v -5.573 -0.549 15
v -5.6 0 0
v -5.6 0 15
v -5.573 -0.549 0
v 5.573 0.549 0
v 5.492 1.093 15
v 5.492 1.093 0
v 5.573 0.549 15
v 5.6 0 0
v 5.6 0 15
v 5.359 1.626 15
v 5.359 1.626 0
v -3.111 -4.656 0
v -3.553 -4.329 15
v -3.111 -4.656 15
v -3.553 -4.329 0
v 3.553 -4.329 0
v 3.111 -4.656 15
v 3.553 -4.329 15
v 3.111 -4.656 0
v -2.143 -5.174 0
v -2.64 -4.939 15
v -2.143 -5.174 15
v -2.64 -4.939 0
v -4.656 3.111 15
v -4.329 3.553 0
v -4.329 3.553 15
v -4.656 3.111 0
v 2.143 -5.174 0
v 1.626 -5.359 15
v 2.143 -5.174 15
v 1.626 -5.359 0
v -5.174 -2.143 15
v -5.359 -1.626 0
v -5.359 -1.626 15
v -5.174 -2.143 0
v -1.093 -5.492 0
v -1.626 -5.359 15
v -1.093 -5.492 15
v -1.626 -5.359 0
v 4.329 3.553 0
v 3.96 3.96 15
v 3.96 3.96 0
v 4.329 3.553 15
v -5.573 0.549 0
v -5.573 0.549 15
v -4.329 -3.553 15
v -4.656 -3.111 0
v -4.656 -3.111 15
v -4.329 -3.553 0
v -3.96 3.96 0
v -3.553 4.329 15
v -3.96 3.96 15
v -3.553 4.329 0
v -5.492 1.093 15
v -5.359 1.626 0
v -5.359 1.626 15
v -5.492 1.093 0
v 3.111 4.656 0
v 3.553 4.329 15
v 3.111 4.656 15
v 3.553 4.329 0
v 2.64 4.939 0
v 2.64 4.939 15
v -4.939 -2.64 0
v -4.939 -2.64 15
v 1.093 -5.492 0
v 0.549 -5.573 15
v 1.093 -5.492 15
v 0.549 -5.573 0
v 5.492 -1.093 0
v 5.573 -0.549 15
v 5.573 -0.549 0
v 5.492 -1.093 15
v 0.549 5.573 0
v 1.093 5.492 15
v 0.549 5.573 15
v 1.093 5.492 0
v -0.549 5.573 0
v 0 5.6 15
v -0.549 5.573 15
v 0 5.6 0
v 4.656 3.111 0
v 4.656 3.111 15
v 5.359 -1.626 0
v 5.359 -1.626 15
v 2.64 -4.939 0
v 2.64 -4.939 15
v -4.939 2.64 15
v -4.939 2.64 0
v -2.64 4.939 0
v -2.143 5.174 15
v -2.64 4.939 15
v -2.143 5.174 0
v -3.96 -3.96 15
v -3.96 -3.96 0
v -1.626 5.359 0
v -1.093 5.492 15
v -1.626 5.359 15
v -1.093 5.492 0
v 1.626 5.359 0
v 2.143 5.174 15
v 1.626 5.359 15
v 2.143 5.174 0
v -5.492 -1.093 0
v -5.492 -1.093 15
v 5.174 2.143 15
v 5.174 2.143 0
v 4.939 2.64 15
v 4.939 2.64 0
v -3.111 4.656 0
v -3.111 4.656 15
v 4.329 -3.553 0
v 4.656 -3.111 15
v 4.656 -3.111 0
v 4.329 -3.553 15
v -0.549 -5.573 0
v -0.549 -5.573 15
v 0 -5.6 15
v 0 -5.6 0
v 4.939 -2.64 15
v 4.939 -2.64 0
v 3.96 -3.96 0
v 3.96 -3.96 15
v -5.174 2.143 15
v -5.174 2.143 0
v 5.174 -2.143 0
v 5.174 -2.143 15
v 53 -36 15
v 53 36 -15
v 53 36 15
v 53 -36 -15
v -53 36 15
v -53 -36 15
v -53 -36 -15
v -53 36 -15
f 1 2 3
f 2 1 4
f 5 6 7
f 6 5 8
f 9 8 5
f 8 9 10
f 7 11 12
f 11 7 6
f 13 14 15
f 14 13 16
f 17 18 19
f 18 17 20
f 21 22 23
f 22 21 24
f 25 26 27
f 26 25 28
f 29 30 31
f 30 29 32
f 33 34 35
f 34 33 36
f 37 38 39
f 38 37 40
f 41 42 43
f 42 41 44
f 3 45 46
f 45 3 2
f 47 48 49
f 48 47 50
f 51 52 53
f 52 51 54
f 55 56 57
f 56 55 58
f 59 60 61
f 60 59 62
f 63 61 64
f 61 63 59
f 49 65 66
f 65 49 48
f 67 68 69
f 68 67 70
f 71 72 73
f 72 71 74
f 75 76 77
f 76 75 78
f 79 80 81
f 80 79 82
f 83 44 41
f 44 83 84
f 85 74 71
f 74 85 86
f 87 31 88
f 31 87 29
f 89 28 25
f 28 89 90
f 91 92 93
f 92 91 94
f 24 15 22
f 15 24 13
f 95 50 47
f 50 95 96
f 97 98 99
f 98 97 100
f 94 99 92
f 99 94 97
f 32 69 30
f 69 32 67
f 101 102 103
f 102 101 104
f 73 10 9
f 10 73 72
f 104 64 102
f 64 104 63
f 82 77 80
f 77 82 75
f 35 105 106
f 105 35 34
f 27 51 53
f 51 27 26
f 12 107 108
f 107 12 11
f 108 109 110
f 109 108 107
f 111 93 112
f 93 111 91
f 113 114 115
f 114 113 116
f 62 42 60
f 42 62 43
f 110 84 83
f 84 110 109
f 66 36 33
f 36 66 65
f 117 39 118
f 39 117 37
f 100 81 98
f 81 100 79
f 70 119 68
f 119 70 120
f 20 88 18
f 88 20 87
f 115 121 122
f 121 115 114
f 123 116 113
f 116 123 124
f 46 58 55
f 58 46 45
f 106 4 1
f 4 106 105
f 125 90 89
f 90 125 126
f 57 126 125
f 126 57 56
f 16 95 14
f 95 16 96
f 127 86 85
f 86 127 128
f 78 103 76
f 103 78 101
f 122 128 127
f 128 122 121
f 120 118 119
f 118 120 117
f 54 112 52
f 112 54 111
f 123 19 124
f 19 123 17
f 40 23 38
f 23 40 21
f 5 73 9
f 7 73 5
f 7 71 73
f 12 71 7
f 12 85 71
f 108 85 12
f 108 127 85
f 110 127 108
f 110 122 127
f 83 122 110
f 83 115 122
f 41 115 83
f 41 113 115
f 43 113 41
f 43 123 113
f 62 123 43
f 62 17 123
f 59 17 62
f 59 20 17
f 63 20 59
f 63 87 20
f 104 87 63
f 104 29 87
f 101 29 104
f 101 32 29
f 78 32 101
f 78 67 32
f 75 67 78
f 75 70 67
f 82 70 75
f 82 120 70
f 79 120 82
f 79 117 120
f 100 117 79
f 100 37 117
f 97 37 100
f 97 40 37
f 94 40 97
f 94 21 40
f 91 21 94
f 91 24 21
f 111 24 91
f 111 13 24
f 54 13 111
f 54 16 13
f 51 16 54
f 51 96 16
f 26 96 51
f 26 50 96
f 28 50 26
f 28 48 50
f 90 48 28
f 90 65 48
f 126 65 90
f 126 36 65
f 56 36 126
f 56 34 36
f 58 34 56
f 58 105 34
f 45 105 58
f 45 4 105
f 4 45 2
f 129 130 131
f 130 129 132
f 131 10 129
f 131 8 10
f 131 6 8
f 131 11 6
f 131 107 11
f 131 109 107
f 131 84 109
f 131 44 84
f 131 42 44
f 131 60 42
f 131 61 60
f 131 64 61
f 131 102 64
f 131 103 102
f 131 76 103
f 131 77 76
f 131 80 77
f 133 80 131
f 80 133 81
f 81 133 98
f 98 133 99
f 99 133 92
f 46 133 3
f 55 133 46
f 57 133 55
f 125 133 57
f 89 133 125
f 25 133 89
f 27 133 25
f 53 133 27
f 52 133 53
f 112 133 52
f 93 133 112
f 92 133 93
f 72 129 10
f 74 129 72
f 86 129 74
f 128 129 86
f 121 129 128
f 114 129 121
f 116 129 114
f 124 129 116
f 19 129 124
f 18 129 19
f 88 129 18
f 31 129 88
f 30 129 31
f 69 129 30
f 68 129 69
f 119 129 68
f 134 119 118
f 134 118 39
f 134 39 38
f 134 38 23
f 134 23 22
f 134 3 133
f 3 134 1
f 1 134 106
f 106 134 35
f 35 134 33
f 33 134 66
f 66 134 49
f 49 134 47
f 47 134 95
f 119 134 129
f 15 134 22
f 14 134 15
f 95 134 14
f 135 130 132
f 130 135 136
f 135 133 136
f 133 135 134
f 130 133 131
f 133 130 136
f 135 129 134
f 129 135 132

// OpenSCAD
// Bench Rack for 1.5 mL Microcentrifuge Tubes
// Dimensions based on user specifications

// Block Dimensions
BLOCK_LENGTH_X = 106; // mm
BLOCK_WIDTH_Y = 72;   // mm
BLOCK_HEIGHT_Z = 30;  // mm

// Grid Configuration
NUM_ROWS_Y = 4;       // Rows along Y
NUM_COLS_X = 6;       // Columns along X
GRID_SPACING_X = 16;  // mm centre-to-centre
GRID_SPACING_Y = 16;  // mm centre-to-centre

// Hole Dimensions
HOLE_DIAMETER = 11.2; // mm
HOLE_DEPTH = 25;      // mm (open top, closed bottom)
FLOOR_HEIGHT = 5;     // mm (solid floor at bottom)

// Tolerance for cutting operations (to ensure clean removal)
CUT_TOLERANCE = 0.1;  // mm

// Set global faceting for smooth curves
$fn = 64;

// Calculate grid offsets to center the grid on the block
// Total span X = (NUM_COLS_X - 1) * GRID_SPACING_X
// Offset X = (BLOCK_LENGTH_X - Total span X) / 2
GRID_OFFSET_X = (BLOCK_LENGTH_X - (NUM_COLS_X - 1) * GRID_SPACING_X) / 2;

// Total span Y = (NUM_ROWS_Y - 1) * GRID_SPACING_Y
// Offset Y = (BLOCK_WIDTH_Y - Total span Y) / 2
GRID_OFFSET_Y = (BLOCK_WIDTH_Y - (NUM_ROWS_Y - 1) * GRID_SPACING_Y) / 2;

// Main Block
difference() {
    // Create the solid rectangular block
    cube([BLOCK_LENGTH_X, BLOCK_WIDTH_Y, BLOCK_HEIGHT_Z], center = true);
    
    // Create holes
    // We use a loop to generate cylinders that cut through the block
    // The cylinder height is the full block height to ensure clean cuts
    for (r = [0 : NUM_ROWS_Y - 1]) {
        for (c = [0 : NUM_COLS_X - 1]) {
            // Calculate position of each hole center
            pos_x = GRID_OFFSET_X + c * GRID_SPACING_X;
            pos_y = GRID_OFFSET_Y + r * GRID_SPACING_Y;
            
            // Define the cutting cylinder
            // Radius is half diameter
            // Height is slightly more than block height to ensure full cut
            // Z position is centered in the block
            cylinder(
                h = BLOCK_HEIGHT_Z + (CUT_TOLERANCE * 2),
                r = HOLE_DIAMETER / 2,
                center = [pos_x, pos_y, 0],
                $fn = 64
            );
        }
    }
}
